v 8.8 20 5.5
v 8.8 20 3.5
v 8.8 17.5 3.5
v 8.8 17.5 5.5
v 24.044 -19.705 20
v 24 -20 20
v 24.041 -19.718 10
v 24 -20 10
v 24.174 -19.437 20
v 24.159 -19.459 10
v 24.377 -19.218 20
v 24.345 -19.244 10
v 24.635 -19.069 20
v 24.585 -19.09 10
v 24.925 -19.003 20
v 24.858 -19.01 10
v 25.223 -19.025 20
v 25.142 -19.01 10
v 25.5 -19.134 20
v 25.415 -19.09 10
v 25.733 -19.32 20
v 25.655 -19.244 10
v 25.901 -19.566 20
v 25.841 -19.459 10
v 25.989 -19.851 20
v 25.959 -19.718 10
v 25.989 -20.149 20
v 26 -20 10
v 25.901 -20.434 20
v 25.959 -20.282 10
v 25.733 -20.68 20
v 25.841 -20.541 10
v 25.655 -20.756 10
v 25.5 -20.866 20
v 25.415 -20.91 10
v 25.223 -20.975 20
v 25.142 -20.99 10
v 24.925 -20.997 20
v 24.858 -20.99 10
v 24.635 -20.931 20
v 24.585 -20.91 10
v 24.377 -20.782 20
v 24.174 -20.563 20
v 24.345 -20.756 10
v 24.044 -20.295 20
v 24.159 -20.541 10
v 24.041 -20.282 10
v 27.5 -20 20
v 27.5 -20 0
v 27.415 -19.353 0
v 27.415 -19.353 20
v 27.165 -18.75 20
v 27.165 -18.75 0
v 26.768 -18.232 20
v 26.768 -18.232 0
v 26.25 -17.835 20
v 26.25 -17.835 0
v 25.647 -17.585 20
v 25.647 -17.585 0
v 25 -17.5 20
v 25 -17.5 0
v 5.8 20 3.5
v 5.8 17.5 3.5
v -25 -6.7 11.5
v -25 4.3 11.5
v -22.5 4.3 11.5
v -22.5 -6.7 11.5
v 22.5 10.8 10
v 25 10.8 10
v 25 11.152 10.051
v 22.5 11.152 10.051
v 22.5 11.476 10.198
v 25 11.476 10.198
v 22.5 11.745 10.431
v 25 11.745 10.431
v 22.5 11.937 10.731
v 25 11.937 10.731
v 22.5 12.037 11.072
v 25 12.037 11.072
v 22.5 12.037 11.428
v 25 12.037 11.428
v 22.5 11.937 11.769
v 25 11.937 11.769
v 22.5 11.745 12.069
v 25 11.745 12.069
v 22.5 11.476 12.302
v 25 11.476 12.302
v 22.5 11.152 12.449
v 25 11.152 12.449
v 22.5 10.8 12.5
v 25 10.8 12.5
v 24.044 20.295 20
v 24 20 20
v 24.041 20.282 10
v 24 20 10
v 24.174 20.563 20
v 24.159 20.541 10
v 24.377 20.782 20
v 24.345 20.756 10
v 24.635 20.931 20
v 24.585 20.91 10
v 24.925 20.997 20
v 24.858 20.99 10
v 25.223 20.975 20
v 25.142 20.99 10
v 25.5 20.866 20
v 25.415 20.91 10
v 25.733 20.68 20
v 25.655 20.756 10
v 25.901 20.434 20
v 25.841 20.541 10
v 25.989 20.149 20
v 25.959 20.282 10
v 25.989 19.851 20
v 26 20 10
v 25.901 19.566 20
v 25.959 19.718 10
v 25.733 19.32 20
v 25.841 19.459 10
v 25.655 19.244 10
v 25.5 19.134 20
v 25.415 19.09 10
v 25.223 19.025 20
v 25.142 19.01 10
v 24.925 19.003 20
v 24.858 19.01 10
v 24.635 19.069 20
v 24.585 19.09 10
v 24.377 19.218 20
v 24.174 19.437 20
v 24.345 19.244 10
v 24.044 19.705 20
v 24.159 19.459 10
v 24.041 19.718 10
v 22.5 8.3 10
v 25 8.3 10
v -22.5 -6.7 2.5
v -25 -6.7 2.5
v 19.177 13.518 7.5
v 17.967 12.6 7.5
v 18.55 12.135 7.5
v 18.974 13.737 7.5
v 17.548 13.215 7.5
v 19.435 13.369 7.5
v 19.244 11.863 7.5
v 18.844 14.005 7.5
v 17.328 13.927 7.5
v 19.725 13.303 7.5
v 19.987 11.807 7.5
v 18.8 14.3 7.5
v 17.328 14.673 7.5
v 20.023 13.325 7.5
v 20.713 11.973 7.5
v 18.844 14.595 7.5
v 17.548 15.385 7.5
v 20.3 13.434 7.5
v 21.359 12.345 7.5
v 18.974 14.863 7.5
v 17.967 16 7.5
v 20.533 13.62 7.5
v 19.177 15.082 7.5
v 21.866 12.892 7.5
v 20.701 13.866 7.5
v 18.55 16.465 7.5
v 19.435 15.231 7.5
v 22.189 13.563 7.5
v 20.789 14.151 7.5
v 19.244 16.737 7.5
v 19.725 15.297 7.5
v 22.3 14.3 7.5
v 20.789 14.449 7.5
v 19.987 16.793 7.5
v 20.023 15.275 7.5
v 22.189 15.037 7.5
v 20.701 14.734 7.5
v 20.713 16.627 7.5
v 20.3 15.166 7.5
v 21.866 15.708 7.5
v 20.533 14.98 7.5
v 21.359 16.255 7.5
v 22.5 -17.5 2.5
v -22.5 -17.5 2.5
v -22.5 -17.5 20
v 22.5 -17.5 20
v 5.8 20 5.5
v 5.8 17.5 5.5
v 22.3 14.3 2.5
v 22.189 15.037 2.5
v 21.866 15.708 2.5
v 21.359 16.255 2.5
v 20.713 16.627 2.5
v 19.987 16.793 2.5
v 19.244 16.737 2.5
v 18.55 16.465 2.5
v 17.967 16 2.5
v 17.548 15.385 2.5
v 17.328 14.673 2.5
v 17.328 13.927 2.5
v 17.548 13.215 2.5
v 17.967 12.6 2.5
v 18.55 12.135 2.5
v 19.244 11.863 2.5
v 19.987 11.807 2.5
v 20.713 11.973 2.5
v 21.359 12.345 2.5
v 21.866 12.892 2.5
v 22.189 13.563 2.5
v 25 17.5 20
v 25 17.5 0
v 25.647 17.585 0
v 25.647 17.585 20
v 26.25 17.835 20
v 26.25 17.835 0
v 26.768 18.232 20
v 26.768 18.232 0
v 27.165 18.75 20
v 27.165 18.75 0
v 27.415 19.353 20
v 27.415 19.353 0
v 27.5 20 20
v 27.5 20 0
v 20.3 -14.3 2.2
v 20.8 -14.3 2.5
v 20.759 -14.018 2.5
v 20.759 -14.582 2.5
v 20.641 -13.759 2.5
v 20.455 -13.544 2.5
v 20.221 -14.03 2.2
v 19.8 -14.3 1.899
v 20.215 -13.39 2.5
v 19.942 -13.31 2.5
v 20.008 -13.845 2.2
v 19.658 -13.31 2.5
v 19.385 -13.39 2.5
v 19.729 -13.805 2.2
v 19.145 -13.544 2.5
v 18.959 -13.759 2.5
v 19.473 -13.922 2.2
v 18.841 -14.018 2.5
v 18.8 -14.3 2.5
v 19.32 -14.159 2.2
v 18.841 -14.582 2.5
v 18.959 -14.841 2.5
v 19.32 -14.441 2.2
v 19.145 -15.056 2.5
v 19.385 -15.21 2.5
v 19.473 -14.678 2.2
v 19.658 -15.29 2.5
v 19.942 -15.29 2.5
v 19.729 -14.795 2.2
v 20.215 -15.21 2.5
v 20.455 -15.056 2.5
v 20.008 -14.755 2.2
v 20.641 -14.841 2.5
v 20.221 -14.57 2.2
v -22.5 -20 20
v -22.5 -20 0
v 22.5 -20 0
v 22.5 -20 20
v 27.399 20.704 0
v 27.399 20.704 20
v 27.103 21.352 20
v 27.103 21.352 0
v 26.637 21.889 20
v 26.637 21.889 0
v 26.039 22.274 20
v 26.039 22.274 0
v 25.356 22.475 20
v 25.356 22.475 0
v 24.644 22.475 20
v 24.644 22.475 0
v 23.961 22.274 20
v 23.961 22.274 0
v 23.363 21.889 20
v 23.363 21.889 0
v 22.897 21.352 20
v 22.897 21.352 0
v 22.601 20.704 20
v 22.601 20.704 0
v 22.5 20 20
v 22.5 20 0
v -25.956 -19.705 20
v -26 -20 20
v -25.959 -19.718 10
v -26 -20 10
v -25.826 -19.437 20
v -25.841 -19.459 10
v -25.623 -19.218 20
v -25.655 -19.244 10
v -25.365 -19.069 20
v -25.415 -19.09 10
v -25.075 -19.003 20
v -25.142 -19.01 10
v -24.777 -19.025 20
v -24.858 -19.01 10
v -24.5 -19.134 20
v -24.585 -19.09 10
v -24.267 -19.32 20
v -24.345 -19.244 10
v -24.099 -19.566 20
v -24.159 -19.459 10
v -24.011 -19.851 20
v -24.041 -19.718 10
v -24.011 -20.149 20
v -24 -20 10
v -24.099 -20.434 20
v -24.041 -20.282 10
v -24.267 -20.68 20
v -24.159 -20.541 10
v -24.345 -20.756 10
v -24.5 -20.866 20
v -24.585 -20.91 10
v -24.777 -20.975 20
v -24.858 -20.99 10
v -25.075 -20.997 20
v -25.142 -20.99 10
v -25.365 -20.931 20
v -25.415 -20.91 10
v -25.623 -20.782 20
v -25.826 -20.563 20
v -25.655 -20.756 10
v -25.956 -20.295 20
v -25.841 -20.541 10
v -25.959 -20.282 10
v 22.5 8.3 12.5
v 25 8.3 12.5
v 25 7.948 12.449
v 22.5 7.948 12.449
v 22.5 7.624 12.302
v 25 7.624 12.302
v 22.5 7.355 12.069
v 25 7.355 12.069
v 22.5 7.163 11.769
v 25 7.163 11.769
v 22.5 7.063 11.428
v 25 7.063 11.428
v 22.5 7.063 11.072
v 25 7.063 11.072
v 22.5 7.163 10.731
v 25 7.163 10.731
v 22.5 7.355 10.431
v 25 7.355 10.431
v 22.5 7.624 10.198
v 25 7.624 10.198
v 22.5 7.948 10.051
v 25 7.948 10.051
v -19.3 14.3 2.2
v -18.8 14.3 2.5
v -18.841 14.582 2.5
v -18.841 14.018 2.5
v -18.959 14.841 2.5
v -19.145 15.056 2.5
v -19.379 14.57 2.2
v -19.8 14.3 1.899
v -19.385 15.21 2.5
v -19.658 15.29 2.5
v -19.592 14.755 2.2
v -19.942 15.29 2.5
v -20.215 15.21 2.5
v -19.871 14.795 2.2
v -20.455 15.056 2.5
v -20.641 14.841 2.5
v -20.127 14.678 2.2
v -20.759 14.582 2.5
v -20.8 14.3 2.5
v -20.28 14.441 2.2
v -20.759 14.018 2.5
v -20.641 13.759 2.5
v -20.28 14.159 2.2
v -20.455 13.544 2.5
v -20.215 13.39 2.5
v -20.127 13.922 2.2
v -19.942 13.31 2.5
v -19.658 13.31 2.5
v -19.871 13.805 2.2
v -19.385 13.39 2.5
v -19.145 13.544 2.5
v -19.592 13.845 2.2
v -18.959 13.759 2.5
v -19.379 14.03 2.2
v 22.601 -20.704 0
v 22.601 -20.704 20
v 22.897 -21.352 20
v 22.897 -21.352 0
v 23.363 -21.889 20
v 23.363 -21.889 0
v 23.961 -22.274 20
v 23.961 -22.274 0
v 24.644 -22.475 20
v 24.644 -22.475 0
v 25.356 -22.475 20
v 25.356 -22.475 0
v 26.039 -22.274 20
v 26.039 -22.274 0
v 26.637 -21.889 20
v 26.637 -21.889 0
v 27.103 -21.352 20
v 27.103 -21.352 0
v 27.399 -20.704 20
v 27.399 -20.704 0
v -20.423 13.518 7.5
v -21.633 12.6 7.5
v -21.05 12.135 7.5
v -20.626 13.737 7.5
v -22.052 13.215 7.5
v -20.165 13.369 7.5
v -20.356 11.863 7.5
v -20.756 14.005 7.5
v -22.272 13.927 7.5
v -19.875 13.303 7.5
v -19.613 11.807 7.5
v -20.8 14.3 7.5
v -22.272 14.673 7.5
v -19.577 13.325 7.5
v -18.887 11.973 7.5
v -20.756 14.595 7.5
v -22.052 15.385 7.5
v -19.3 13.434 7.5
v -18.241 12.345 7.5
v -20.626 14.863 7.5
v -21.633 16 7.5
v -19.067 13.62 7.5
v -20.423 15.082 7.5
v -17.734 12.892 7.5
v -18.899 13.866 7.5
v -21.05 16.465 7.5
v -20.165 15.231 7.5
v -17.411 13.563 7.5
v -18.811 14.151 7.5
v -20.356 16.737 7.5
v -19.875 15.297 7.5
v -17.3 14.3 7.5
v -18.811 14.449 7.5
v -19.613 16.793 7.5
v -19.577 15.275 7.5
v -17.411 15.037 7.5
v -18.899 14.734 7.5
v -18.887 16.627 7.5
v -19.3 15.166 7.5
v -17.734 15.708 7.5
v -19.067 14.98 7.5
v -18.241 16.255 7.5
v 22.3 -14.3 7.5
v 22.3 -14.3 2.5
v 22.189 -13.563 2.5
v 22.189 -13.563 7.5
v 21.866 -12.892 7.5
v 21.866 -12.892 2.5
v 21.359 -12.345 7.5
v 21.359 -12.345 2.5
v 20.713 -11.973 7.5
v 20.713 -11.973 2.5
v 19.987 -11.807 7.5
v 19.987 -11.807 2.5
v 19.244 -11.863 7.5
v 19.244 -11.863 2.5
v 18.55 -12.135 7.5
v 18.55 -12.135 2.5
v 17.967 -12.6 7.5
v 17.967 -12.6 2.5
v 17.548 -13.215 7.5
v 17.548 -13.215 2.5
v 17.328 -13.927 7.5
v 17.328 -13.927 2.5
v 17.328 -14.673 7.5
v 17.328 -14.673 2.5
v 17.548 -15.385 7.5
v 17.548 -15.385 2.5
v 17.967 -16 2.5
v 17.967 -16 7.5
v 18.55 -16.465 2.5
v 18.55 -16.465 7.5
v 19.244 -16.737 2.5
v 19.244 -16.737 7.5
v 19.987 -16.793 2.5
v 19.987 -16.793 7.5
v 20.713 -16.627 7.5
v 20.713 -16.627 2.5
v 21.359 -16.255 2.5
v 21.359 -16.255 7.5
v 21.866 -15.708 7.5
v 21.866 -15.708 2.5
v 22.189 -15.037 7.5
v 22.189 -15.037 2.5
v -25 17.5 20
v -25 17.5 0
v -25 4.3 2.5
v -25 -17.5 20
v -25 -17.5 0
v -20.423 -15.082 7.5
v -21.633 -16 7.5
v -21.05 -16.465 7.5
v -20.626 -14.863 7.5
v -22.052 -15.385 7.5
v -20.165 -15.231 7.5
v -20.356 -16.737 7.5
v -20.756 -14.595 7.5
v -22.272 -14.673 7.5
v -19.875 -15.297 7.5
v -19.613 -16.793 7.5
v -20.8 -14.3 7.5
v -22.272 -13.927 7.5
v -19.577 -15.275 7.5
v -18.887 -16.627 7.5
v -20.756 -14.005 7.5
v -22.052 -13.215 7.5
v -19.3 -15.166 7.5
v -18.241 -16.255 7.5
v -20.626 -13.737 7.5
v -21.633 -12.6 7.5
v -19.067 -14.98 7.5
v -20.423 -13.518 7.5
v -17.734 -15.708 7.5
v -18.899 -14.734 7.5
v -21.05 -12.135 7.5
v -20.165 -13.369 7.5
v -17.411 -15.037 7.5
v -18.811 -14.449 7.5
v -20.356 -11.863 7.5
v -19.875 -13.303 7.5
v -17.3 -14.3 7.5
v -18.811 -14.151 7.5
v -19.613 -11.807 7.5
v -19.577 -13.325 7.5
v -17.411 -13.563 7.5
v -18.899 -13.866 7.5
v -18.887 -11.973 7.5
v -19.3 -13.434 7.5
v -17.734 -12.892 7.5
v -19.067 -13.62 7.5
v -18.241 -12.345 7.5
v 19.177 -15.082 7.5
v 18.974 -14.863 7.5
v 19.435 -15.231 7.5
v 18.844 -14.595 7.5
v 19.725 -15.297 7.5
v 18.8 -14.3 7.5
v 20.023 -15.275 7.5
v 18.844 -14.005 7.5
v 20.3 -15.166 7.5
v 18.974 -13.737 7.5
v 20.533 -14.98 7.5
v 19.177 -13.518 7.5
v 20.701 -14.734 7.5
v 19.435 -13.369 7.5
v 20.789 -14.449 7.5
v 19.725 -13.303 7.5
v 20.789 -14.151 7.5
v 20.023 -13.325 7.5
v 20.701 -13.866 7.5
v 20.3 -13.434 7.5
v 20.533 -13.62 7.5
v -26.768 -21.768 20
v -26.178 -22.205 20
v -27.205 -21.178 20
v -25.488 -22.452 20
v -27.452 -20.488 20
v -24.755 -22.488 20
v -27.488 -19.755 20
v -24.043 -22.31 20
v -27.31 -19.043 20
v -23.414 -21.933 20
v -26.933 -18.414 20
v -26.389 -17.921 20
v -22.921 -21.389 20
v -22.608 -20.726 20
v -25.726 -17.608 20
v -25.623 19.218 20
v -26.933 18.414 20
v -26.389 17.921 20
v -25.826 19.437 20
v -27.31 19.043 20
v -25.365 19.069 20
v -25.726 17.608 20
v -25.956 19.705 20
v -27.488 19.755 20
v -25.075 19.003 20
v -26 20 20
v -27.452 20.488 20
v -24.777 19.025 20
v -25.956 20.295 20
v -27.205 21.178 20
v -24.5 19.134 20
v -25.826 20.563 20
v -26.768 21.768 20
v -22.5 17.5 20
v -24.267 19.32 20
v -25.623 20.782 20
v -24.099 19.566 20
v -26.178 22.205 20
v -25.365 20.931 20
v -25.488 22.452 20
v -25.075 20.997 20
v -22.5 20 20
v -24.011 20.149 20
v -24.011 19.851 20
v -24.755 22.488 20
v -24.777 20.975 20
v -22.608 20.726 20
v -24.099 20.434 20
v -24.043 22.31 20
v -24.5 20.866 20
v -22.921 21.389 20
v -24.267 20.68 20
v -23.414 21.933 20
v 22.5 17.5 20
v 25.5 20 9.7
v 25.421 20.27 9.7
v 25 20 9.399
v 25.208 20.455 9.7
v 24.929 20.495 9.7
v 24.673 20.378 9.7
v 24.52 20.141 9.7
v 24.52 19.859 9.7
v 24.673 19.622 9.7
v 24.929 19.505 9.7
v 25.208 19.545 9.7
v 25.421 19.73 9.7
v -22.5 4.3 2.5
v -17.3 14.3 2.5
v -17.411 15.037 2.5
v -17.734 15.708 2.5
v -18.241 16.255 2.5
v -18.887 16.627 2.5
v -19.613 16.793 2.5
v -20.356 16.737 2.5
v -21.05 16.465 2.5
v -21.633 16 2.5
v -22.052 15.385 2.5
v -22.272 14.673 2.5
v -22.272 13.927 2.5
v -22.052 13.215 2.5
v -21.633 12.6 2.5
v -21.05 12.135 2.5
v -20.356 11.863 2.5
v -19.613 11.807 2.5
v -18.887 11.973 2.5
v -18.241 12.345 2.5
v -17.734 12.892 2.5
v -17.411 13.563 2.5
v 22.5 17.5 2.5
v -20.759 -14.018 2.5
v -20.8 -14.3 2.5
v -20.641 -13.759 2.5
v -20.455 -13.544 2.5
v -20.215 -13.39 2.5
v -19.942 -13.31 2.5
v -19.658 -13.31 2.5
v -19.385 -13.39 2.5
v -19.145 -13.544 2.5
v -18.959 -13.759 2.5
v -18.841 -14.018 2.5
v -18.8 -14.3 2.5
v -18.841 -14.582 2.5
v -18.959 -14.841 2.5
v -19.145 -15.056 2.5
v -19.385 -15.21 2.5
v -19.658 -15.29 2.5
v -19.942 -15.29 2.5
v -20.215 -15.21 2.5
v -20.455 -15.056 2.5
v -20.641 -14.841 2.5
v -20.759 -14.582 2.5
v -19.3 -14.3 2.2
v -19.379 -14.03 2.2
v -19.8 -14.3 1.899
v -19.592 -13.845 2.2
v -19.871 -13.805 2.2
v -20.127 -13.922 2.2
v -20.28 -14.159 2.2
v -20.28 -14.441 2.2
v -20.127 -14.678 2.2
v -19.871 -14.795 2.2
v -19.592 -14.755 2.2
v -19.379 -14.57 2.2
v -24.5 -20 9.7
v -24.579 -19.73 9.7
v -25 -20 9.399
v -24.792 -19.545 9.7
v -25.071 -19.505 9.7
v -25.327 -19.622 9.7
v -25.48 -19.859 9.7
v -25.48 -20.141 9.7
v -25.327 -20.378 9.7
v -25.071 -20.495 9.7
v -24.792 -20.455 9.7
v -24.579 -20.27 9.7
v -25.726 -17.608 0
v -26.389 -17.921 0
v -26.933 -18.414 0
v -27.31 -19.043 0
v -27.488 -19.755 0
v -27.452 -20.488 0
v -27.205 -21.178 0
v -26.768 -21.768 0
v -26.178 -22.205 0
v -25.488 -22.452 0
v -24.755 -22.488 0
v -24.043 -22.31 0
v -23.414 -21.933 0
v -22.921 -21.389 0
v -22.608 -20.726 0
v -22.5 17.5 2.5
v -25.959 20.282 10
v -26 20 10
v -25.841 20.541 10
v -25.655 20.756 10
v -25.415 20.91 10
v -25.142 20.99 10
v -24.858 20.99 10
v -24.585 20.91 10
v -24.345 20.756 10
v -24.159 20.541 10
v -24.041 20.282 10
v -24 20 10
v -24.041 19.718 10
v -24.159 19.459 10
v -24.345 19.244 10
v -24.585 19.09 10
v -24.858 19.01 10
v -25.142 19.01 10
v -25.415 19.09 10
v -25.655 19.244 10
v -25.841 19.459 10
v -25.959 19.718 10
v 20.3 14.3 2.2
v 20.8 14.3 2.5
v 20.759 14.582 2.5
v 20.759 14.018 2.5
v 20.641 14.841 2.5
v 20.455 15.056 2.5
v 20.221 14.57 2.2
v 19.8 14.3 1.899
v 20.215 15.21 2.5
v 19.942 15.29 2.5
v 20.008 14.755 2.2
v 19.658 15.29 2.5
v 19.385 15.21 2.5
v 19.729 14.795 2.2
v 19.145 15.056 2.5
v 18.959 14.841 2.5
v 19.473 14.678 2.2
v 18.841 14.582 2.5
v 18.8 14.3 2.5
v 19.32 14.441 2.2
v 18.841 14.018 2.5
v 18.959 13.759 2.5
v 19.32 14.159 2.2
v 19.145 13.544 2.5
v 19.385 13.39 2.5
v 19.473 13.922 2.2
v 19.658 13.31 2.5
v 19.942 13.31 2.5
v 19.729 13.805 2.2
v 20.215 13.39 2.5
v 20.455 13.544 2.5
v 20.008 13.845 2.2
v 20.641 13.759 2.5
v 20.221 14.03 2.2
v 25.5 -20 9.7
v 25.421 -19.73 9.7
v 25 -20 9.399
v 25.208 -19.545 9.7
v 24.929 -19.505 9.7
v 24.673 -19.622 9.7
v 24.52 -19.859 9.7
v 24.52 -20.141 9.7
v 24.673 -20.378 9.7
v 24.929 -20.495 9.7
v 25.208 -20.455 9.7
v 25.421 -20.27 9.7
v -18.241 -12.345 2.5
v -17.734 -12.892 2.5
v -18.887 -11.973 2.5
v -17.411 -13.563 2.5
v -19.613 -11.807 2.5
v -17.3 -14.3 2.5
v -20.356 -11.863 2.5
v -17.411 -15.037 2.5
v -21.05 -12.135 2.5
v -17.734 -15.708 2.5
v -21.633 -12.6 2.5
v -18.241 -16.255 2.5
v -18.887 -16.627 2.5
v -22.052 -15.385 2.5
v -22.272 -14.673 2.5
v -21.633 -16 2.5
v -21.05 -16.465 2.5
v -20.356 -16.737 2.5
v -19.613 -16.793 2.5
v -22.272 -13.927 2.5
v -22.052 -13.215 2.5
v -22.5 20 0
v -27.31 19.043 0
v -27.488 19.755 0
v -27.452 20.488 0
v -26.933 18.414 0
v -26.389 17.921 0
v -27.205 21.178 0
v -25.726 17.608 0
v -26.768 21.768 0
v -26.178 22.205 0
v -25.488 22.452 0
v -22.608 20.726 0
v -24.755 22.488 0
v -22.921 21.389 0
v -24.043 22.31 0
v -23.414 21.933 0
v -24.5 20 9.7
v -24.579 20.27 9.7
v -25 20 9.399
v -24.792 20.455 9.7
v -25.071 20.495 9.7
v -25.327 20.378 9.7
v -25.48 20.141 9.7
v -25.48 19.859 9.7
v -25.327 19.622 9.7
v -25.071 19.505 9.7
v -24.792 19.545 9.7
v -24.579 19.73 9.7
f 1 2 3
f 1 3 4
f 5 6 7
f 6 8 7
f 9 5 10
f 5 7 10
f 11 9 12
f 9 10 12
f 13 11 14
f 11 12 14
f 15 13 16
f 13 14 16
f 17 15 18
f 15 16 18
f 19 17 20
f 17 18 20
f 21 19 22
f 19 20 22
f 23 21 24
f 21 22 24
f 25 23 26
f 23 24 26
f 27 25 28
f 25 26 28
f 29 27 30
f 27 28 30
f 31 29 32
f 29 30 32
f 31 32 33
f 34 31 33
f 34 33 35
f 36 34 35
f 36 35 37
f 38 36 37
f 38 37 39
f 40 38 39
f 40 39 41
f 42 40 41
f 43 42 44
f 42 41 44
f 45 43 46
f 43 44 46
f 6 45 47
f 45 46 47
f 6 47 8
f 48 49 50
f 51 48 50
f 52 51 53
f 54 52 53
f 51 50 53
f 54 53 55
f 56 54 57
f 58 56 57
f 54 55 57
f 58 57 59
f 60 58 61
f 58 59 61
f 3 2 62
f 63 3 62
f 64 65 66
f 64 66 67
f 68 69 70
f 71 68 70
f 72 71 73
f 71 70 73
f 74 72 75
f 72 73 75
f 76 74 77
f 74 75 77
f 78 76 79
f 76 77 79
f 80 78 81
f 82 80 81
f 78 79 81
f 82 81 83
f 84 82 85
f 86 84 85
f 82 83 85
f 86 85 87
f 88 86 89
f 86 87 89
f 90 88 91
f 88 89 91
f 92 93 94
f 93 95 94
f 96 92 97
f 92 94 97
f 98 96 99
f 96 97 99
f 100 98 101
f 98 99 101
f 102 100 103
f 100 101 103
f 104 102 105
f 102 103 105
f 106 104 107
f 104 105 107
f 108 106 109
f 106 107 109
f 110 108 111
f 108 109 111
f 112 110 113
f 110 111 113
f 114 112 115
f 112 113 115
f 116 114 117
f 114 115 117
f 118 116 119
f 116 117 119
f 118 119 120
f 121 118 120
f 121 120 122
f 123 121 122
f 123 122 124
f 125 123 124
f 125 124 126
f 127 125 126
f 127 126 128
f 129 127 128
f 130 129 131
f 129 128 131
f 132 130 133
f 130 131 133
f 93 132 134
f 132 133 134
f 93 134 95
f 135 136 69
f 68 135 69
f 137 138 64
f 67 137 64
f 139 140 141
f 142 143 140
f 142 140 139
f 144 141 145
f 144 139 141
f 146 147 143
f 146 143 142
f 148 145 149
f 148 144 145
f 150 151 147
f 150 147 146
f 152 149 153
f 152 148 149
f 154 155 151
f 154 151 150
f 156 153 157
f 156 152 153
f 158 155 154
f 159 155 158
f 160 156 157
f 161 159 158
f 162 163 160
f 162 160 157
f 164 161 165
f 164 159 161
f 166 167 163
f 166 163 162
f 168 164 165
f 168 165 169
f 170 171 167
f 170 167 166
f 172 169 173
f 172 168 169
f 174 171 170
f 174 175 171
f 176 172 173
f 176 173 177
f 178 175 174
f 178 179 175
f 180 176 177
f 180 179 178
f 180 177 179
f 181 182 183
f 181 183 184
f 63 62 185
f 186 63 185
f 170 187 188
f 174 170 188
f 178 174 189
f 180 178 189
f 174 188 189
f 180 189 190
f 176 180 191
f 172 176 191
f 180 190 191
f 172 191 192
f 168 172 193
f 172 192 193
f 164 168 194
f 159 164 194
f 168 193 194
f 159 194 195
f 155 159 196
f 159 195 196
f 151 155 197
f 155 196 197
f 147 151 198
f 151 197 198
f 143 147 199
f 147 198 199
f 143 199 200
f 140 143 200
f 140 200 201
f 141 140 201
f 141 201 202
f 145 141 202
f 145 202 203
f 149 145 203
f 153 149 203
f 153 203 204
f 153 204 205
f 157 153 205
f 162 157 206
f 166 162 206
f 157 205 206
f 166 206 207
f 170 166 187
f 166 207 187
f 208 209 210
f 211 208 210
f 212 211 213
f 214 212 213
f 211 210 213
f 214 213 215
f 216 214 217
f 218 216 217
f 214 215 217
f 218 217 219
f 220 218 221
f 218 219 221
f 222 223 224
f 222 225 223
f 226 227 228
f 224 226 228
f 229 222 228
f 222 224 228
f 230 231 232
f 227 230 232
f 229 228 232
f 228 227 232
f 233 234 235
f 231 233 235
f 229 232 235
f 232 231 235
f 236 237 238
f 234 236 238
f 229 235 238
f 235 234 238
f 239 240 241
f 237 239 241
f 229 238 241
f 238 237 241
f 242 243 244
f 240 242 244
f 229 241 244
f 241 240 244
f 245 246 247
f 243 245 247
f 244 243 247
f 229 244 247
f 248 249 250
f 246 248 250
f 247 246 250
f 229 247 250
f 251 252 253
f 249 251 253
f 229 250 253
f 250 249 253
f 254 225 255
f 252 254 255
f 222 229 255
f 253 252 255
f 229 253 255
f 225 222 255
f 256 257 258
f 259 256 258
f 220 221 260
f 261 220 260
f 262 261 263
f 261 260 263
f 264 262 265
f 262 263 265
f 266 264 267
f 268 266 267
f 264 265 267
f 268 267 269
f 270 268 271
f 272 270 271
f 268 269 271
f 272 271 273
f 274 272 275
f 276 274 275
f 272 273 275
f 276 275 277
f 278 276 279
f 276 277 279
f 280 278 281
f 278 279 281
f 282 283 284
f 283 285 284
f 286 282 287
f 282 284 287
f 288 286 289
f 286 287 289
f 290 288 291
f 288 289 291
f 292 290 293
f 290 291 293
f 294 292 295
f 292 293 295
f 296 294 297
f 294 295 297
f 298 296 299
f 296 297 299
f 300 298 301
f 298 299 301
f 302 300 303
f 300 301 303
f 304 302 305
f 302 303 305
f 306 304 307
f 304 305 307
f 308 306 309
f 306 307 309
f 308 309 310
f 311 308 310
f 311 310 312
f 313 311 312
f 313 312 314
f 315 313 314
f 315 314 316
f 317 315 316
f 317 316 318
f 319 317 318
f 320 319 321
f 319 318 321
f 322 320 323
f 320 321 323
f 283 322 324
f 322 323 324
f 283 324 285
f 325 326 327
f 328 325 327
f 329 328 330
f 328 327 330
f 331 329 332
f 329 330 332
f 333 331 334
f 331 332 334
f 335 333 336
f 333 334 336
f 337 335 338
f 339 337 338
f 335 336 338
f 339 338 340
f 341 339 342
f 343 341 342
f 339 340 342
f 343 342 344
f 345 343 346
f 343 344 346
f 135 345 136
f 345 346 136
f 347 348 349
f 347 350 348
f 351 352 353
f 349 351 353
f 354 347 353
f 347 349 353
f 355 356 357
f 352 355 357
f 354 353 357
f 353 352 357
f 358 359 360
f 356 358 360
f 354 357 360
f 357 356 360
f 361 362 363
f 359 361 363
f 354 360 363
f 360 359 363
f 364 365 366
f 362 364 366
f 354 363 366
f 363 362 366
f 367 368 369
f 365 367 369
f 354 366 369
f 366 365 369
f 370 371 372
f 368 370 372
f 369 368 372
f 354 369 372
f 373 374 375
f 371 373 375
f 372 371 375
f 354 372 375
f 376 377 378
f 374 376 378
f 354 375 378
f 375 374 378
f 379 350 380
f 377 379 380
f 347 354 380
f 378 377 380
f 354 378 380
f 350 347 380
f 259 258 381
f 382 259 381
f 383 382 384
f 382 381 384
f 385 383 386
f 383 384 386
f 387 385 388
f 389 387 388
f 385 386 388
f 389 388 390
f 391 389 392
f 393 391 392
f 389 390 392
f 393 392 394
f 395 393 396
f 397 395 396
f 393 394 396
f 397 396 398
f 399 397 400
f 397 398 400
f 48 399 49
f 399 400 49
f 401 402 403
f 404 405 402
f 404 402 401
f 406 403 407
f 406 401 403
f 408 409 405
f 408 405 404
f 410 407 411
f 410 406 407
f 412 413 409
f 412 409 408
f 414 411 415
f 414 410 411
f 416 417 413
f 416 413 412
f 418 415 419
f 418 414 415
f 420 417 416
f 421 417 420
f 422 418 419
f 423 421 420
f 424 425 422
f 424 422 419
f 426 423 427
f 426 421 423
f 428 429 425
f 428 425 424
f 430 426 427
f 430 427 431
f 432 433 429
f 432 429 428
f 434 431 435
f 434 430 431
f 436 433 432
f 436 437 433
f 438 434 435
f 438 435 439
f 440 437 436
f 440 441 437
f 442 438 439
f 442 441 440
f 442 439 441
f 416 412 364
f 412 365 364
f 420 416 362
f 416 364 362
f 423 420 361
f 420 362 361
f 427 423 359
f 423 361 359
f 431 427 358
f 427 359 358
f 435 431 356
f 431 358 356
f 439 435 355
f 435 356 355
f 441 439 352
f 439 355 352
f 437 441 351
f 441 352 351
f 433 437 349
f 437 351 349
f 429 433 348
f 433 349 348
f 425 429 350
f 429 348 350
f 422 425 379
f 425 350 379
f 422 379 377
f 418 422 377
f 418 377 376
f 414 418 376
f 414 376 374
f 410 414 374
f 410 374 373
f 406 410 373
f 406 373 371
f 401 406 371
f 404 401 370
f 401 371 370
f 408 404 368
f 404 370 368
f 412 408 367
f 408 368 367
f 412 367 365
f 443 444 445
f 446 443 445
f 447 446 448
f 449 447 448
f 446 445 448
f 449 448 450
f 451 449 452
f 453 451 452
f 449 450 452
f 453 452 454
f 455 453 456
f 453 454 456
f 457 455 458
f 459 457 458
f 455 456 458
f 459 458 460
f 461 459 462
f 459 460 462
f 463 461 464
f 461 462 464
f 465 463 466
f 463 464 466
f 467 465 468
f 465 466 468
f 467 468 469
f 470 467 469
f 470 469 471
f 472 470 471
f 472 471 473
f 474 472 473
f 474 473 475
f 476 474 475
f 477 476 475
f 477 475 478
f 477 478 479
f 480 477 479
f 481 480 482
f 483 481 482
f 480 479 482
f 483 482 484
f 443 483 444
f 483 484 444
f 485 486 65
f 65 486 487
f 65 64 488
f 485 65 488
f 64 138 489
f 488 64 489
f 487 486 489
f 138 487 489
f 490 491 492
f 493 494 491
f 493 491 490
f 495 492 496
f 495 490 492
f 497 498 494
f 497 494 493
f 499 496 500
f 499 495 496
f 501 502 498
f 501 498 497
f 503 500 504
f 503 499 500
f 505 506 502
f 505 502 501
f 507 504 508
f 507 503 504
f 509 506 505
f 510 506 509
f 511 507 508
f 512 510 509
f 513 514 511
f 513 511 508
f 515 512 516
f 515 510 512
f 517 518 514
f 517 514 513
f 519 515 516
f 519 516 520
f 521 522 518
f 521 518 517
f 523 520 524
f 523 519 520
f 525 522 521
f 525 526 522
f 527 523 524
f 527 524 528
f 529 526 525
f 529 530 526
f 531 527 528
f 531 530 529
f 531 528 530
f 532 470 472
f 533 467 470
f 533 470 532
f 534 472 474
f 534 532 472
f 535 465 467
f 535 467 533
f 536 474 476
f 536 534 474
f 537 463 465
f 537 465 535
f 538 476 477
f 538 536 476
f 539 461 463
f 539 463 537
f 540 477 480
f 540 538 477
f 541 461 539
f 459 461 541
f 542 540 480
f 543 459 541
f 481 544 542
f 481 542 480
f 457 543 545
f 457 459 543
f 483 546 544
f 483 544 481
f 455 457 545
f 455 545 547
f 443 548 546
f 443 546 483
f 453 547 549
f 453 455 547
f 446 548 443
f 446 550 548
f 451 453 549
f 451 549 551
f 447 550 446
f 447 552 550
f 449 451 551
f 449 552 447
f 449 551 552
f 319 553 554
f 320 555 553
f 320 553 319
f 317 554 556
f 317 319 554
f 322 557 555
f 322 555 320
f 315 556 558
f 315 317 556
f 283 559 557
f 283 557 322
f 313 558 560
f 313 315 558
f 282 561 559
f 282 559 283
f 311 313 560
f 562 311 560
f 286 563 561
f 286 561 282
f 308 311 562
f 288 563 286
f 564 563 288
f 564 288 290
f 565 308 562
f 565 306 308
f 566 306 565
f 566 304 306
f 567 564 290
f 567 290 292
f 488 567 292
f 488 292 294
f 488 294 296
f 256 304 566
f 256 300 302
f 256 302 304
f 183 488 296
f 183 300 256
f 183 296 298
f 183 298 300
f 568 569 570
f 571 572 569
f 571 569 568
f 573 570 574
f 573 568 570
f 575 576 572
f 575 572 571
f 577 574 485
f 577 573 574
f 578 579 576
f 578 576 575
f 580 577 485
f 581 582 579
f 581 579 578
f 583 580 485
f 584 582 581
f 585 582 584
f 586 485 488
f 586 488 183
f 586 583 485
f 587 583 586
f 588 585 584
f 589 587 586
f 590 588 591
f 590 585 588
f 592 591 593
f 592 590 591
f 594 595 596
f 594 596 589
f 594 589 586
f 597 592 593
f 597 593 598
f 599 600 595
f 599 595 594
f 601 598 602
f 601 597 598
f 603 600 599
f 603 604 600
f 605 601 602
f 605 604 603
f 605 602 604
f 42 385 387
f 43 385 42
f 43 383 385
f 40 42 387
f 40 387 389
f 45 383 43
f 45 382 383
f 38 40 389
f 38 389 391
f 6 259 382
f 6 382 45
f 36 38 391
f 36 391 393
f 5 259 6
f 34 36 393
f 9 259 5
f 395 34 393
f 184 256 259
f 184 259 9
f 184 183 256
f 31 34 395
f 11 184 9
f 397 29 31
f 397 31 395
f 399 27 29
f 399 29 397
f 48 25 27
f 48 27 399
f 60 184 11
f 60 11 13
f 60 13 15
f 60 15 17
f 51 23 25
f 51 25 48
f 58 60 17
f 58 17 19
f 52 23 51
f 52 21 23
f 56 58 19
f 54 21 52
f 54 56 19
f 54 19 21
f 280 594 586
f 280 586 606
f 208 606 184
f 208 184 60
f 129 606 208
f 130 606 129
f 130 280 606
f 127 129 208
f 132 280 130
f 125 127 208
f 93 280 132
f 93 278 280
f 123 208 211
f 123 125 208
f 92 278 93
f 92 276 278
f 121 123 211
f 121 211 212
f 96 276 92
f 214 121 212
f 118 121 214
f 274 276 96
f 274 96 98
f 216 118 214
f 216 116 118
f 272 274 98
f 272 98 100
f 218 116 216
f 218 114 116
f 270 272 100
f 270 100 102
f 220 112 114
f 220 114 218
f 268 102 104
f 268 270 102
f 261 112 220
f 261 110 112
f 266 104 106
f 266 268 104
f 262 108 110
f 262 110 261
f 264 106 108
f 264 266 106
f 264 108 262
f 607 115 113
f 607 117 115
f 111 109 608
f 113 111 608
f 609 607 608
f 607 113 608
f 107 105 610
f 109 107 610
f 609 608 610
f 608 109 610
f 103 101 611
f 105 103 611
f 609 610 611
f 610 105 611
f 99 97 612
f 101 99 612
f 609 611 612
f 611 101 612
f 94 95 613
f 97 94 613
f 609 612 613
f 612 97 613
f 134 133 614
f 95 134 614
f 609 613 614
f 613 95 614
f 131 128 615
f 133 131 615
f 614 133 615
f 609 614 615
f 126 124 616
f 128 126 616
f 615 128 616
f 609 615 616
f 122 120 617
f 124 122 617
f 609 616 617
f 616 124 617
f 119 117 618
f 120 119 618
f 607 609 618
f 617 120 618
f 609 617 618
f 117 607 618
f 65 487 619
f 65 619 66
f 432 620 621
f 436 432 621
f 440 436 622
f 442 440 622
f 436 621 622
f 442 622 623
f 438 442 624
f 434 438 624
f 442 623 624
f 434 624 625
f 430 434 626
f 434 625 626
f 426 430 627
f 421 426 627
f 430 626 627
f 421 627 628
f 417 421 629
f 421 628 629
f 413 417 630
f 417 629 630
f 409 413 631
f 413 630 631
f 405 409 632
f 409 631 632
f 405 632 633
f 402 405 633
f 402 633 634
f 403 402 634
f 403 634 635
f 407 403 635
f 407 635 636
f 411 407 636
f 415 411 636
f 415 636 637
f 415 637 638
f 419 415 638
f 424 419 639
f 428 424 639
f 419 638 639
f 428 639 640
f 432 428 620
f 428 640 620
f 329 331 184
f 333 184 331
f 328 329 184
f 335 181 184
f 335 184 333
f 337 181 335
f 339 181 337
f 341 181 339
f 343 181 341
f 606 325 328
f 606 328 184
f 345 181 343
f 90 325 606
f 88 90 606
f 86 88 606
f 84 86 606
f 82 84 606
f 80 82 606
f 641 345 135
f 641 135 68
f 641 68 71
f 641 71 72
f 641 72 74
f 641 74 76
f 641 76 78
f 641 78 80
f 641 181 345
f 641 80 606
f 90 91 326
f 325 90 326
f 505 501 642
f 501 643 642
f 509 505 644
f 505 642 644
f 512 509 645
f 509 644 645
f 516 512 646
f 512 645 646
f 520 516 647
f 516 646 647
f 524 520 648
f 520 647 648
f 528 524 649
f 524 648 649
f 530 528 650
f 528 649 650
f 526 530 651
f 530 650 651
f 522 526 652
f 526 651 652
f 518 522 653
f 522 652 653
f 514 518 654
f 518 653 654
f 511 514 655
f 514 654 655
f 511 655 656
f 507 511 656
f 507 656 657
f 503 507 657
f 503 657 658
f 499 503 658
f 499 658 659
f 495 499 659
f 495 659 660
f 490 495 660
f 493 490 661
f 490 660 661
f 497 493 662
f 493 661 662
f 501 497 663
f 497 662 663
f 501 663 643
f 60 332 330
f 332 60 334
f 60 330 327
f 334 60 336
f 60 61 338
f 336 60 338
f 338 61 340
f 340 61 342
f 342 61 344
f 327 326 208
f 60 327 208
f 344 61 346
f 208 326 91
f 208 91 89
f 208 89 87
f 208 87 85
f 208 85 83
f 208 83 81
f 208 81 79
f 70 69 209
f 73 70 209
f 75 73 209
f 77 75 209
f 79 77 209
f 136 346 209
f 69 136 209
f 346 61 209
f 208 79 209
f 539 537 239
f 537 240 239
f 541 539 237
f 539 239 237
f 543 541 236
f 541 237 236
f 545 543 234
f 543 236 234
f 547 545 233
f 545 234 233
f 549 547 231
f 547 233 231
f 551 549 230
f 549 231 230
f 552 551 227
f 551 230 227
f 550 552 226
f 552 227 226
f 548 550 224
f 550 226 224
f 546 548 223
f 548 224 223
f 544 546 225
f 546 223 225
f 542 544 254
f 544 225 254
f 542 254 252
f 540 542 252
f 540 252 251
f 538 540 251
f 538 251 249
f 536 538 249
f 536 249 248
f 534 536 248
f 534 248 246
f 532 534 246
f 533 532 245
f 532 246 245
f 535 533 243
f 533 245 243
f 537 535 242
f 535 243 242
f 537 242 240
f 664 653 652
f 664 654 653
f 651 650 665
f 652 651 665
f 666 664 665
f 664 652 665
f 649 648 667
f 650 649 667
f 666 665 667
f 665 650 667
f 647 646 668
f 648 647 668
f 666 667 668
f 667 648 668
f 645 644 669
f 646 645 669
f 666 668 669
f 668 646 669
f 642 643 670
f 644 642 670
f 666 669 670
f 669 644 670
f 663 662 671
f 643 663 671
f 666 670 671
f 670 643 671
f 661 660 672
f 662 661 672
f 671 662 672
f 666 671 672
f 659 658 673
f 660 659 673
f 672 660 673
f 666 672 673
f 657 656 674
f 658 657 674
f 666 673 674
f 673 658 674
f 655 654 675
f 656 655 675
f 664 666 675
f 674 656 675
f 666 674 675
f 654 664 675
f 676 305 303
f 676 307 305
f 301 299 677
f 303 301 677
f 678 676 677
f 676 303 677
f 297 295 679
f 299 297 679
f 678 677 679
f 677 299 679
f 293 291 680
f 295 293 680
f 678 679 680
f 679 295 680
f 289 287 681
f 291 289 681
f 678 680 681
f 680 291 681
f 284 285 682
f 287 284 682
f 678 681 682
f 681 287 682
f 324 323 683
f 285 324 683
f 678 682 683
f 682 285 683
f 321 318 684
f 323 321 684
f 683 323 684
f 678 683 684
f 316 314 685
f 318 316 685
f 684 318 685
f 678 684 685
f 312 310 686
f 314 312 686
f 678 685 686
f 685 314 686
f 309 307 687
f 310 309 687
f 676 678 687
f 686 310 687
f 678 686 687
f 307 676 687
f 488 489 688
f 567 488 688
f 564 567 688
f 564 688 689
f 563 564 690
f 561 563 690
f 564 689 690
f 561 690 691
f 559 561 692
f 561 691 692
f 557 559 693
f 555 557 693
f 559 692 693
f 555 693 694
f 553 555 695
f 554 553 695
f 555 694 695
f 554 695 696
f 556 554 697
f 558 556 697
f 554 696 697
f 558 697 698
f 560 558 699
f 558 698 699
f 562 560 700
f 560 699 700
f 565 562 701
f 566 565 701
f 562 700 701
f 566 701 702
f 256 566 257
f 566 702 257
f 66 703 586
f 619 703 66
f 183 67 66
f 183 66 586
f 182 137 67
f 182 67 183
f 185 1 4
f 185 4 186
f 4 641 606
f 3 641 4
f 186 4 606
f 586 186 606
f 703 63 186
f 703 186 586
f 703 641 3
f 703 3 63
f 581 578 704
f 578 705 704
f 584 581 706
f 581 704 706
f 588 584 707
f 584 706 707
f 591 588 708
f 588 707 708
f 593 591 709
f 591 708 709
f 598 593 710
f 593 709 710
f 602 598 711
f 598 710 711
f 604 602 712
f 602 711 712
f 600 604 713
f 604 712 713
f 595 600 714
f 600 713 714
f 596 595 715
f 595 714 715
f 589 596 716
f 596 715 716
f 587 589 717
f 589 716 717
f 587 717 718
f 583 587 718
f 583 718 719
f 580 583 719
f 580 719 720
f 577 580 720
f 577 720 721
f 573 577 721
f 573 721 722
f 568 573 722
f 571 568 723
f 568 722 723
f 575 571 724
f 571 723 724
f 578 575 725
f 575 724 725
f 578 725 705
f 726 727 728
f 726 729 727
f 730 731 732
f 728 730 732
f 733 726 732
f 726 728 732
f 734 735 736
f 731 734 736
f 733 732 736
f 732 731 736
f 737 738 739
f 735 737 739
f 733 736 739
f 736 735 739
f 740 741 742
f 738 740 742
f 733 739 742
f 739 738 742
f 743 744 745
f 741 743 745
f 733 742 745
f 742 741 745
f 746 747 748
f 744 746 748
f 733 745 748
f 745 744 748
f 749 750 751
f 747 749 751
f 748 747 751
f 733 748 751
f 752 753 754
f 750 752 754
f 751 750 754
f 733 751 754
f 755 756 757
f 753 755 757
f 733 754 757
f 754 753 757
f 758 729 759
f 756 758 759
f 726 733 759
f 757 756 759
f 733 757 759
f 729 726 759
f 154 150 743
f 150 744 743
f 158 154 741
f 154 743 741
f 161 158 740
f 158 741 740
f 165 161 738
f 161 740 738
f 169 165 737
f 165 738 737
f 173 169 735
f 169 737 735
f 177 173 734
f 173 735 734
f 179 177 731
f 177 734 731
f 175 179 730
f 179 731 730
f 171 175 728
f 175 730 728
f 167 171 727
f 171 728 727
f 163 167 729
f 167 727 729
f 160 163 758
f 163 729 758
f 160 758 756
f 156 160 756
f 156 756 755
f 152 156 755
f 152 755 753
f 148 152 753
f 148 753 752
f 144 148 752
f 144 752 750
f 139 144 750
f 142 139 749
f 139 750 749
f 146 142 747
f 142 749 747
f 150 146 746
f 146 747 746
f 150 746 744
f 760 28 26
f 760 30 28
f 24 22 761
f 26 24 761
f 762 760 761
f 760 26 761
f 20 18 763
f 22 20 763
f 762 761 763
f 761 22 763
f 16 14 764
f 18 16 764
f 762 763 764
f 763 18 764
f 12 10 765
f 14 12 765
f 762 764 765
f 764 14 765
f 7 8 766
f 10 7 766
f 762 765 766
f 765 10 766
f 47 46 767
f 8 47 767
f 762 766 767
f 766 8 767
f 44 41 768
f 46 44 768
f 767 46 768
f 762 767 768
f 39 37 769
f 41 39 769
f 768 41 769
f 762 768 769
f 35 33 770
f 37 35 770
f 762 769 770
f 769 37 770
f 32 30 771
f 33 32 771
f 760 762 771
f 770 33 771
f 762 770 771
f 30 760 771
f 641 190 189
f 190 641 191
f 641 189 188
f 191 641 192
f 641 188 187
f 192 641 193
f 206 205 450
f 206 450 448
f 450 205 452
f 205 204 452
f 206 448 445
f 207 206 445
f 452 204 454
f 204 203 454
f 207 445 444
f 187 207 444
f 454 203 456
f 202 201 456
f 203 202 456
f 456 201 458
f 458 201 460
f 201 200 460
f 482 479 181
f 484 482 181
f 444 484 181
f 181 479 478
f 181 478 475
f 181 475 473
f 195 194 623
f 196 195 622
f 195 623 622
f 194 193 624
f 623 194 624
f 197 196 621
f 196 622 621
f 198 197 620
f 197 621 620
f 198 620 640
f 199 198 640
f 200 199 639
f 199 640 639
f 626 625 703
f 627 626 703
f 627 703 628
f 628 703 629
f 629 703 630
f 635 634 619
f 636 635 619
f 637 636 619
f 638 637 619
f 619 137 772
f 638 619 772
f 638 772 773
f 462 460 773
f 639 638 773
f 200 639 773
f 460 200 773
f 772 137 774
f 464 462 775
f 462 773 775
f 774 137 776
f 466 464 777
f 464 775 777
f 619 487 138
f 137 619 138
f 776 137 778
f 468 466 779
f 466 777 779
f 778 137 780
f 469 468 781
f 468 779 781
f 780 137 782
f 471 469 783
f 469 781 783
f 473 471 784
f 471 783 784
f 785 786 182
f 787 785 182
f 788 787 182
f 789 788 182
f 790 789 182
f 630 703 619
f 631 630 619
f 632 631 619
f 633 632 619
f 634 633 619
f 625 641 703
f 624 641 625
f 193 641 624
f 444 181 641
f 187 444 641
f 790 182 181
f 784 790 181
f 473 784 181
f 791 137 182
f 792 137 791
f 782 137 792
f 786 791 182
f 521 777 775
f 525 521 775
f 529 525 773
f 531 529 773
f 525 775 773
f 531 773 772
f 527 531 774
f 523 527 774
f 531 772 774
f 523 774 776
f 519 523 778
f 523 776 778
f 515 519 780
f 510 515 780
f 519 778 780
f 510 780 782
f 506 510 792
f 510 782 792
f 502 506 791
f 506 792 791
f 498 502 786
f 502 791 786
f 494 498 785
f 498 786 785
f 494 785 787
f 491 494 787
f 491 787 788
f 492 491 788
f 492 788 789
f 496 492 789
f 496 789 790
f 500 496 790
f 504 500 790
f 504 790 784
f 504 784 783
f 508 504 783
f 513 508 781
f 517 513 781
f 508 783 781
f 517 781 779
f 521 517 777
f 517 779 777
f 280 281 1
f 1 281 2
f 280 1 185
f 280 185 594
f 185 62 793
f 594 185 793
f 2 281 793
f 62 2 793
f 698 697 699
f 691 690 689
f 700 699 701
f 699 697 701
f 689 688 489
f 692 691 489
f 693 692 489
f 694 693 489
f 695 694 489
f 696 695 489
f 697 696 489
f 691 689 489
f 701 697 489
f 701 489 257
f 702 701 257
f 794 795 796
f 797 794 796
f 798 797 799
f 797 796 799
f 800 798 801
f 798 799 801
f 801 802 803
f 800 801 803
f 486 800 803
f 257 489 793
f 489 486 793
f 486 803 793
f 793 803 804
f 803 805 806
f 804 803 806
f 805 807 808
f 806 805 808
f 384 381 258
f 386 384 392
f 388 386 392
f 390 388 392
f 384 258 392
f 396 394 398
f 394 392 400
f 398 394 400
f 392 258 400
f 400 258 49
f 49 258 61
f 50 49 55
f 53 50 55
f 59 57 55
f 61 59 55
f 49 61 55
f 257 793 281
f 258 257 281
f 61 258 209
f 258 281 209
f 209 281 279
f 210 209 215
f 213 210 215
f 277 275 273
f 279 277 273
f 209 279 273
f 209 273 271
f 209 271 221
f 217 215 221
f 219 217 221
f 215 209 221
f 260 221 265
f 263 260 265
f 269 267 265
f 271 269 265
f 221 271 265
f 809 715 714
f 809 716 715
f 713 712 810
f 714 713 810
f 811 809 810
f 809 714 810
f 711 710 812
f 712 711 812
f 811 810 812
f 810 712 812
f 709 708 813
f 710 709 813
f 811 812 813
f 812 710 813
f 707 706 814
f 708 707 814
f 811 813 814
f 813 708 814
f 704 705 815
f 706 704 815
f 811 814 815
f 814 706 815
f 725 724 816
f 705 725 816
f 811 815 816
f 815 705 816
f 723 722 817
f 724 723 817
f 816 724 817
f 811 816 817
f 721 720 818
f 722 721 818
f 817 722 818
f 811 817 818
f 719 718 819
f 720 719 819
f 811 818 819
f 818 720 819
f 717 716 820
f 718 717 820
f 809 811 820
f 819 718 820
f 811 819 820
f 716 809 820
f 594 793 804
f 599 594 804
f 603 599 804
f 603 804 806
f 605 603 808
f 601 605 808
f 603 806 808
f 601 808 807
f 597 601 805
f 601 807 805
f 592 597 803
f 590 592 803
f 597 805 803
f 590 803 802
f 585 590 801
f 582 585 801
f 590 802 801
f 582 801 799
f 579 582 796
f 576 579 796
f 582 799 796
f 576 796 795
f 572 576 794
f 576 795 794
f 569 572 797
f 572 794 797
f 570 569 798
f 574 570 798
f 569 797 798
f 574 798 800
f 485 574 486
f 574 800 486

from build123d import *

# Parameters (mm, degrees)
F1_DEPTH        = 20
F2_T            = 2.5
F2_T3_DEPTH     = 25
F3_R            = 2.5
F4_DEPTH        = 5
F11_W           = 3
F11_H           = 2
F12_DEPTH       = 5
F13_DEPTH       = 5
F14_W           = 11
F14_H           = 9
F15_DEPTH       = 5
F16_D           = 2
F16_DEPTH       = 10
F16_TIP         = 0.600860619
F17_D           = 2
F17_DEPTH       = 5
F17_TIP         = 0.600860619
F17_ON_F7_D     = 2
F17_ON_F7_DEPTH = 5
F17_ON_F7_TIP   = 0.600860619
F17_ON_F6_D     = 2
F17_ON_F6_DEPTH = 5
F17_ON_F6_TIP   = 0.600860619
F17_ON_F8_D     = 2
F17_ON_F8_DEPTH = 5
F17_ON_F8_TIP   = 0.600860619


# Not quite as in the source:
# - a shell that OpenCascade refuses in one call is made with other operations: the cavity is built on its own and cut out


with BuildPart() as f1:
    # F0 (on Top) → F1 (new body)
    with BuildSketch(Plane.XY):
        with BuildLine():
            Line((-25, 17.5), (-25, 20))
            Line((-25, 20), (-22.5, 20))
            ThreePointArc((-22.5, 20), (-26.767766953, 21.767766953), (-25, 17.5))
        make_face()
        with BuildLine():
            Line((-22.5, 20), (-25, 20))
            Line((-25, 20), (-25, 17.5))
            ThreePointArc((-25, 17.5), (-23.232233047, 18.232233047), (-22.5, 20))
        make_face()
        with BuildLine():
            Line((22.5, 20), (-22.5, 20))
            ThreePointArc((-22.5, 20), (-23.232233047, 18.232233047), (-25, 17.5))
            Line((-25, 17.5), (-25, -17.5))
            ThreePointArc((-25, -17.5), (-23.232233047, -18.232233047), (-22.5, -20))
            Line((-22.5, -20), (22.5, -20))
            ThreePointArc((22.5, -20), (23.232233047, -18.232233047), (25, -17.5))
            Line((25, -17.5), (25, 17.5))
            ThreePointArc((25, 17.5), (23.232233047, 18.232233047), (22.5, 20))
        make_face()
        with BuildLine():
            ThreePointArc((27.5, 20), (25, 22.5), (22.5, 20))
            Line((22.5, 20), (25, 20))
            Line((25, 20), (25, 17.5))
            ThreePointArc((25, 17.5), (26.767766953, 18.232233047), (27.5, 20))
        make_face()
        with BuildLine():
            Line((25, 20), (22.5, 20))
            ThreePointArc((22.5, 20), (23.232233047, 18.232233047), (25, 17.5))
            Line((25, 17.5), (25, 20))
        make_face()
        with BuildLine():
            ThreePointArc((-22.5, -20), (-23.232233047, -18.232233047), (-25, -17.5))
            Line((-25, -17.5), (-25, -20))
            Line((-25, -20), (-22.5, -20))
        make_face()
        with BuildLine():
            Line((-25, -20), (-25, -17.5))
            ThreePointArc((-25, -17.5), (-26.767766953, -21.767766953), (-22.5, -20))
            Line((-22.5, -20), (-25, -20))
        make_face()
        with BuildLine():
            ThreePointArc((27.5, -20), (26.767766953, -18.232233047), (25, -17.5))
            Line((25, -17.5), (25, -20))
            Line((25, -20), (22.5, -20))
            ThreePointArc((22.5, -20), (25, -22.5), (27.5, -20))
        make_face()
        with BuildLine():
            Line((25, -20), (25, -17.5))
            ThreePointArc((25, -17.5), (23.232233047, -18.232233047), (22.5, -20))
            Line((22.5, -20), (25, -20))
        make_face()
    extrude(amount=F1_DEPTH)

    # F2: shell of thickness 2.5, made by hand


with BuildPart() as f2_core1:
    # F2_t2: copy of F1
    add(f1.part)

    # the walls: a layer under each face that stays
    f2_faces = [f2_core1.faces().sort_by_distance(p)[0] for p in [
        (-25, 0, 10),
        (0, -20, 10),
        (25, 0, 10),
        (0, 20, 10),
        (0, 0, 0),
    ]]
    thicken(f2_faces, amount=-F2_T, mode=Mode.SUBTRACT)

    # F2_s4 → F2_t3 (cut)
    with BuildSketch(Plane.XY.offset(-2.5)):
        Polygon((-22.475, 20.025), (-25, 20), (-25, 17.5), (-22.5, 17.5), align=None)
        Polygon((-25.025, 17.475), (-25, 20), (-22.5, 20), (-22.5, 17.5), align=None)
        Polygon((-25.025, -17.475), (-22.5, -17.5), (-22.5, -20), (-25, -20), align=None)
        Polygon((-22.475, -20.025), (-25, -20), (-25, -17.5), (-22.5, -17.5), align=None)
        Polygon((22.475, -20.025), (22.5, -17.5), (25, -17.5), (25, -20), align=None)
        Polygon((25.025, -17.475), (25, -20), (22.5, -20), (22.5, -17.5), align=None)
        Polygon((25.025, 17.475), (22.5, 17.5), (22.5, 20), (25, 20), align=None)
        Polygon((22.475, 20.025), (25, 20), (25, 17.5), (22.5, 17.5), align=None)
    extrude(amount=F2_T3_DEPTH, mode=Mode.SUBTRACT)


with BuildPart() as f1_1:
    add(f1.part)

    # what is left inside the walls is the cavity
    f2_cavity = [f2_core1.part.solids().sort_by_distance(p)[0] for p in [
        (0, -5.833333, 2.525),
    ]]
    add(f2_cavity, mode=Mode.SUBTRACT)

    # F3 (on face) → F4 (join)
    with BuildSketch(Plane.XY.offset(2.5)):
        with Locations((-19.8, 14.3)):
            Circle(F3_R)
        with Locations((19.8, 14.3)):
            Circle(F3_R)
        with Locations((-19.8, -14.3)):
            Circle(F3_R)
        with Locations((19.8, -14.3)):
            Circle(F3_R)
    extrude(amount=F4_DEPTH)

    # F11 (on face) → F12 (cut)
    with BuildSketch(Plane(origin=(0, 20, 0), x_dir=(-1, 0, 0), z_dir=(0, 1, 0))):
        with Locations((-7.3, 4.5)):
            Rectangle(F11_W, F11_H)
    extrude(amount=-F12_DEPTH, mode=Mode.SUBTRACT)

    # F10 (on face) → F13 (cut)
    with BuildSketch(Plane.YZ.offset(25)):
        with BuildLine():
            Line((10.8, 12.5), (8.3, 12.5))
            ThreePointArc((8.3, 12.5), (7.05, 11.25), (8.3, 10))
            Line((8.3, 10), (10.8, 10))
            ThreePointArc((10.8, 10), (12.05, 11.25), (10.8, 12.5))
        make_face()
    extrude(amount=-F13_DEPTH, mode=Mode.SUBTRACT)

    # F14 (on face) → F15 (cut)
    with BuildSketch(Plane(origin=(-25, 0, 0), x_dir=(0, -1, 0), z_dir=(-1, 0, 0))):
        with Locations((1.2, 7)):
            Rectangle(F14_W, F14_H)
    extrude(amount=-F15_DEPTH, mode=Mode.SUBTRACT)

    # F16
    with Locations(Plane.XY.offset(20)):
        with Locations((-25, 20), (25, 20), (-25, -20), (25, -20)):
            Hole(F16_D / 2, depth=F16_DEPTH)
            with Locations((0, 0, -(F16_DEPTH + F16_TIP / 2))):  # 118° drill point
                Cone(0, F16_D / 2, F16_TIP, mode=Mode.SUBTRACT)

    # F17
    with Locations(Plane.XY.offset(7.5)):
        with Locations((-19.8, 14.3)):
            Hole(F17_D / 2, depth=F17_DEPTH)
            with Locations((0, 0, -(F17_DEPTH + F17_TIP / 2))):  # 118° drill point
                Cone(0, F17_D / 2, F17_TIP, mode=Mode.SUBTRACT)

    # F17 on F7
    with Locations(Plane.XY.offset(7.5)):
        with Locations((19.8, 14.3)):
            Hole(F17_ON_F7_D / 2, depth=F17_ON_F7_DEPTH)
            with Locations((0, 0, -(F17_ON_F7_DEPTH + F17_ON_F7_TIP / 2))):  # 118° drill point
                Cone(0, F17_ON_F7_D / 2, F17_ON_F7_TIP, mode=Mode.SUBTRACT)

    # F17 on F6
    with Locations(Plane.XY.offset(7.5)):
        with Locations((-19.8, -14.3)):
            Hole(F17_ON_F6_D / 2, depth=F17_ON_F6_DEPTH)
            with Locations((0, 0, -(F17_ON_F6_DEPTH + F17_ON_F6_TIP / 2))):  # 118° drill point
                Cone(0, F17_ON_F6_D / 2, F17_ON_F6_TIP, mode=Mode.SUBTRACT)

    # F17 on F8
    with Locations(Plane.XY.offset(7.5)):
        with Locations((19.8, -14.3)):
            Hole(F17_ON_F8_D / 2, depth=F17_ON_F8_DEPTH)
            with Locations((0, 0, -(F17_ON_F8_DEPTH + F17_ON_F8_TIP / 2))):  # 118° drill point
                Cone(0, F17_ON_F8_D / 2, F17_ON_F8_TIP, mode=Mode.SUBTRACT)


solid = f1_1.part
